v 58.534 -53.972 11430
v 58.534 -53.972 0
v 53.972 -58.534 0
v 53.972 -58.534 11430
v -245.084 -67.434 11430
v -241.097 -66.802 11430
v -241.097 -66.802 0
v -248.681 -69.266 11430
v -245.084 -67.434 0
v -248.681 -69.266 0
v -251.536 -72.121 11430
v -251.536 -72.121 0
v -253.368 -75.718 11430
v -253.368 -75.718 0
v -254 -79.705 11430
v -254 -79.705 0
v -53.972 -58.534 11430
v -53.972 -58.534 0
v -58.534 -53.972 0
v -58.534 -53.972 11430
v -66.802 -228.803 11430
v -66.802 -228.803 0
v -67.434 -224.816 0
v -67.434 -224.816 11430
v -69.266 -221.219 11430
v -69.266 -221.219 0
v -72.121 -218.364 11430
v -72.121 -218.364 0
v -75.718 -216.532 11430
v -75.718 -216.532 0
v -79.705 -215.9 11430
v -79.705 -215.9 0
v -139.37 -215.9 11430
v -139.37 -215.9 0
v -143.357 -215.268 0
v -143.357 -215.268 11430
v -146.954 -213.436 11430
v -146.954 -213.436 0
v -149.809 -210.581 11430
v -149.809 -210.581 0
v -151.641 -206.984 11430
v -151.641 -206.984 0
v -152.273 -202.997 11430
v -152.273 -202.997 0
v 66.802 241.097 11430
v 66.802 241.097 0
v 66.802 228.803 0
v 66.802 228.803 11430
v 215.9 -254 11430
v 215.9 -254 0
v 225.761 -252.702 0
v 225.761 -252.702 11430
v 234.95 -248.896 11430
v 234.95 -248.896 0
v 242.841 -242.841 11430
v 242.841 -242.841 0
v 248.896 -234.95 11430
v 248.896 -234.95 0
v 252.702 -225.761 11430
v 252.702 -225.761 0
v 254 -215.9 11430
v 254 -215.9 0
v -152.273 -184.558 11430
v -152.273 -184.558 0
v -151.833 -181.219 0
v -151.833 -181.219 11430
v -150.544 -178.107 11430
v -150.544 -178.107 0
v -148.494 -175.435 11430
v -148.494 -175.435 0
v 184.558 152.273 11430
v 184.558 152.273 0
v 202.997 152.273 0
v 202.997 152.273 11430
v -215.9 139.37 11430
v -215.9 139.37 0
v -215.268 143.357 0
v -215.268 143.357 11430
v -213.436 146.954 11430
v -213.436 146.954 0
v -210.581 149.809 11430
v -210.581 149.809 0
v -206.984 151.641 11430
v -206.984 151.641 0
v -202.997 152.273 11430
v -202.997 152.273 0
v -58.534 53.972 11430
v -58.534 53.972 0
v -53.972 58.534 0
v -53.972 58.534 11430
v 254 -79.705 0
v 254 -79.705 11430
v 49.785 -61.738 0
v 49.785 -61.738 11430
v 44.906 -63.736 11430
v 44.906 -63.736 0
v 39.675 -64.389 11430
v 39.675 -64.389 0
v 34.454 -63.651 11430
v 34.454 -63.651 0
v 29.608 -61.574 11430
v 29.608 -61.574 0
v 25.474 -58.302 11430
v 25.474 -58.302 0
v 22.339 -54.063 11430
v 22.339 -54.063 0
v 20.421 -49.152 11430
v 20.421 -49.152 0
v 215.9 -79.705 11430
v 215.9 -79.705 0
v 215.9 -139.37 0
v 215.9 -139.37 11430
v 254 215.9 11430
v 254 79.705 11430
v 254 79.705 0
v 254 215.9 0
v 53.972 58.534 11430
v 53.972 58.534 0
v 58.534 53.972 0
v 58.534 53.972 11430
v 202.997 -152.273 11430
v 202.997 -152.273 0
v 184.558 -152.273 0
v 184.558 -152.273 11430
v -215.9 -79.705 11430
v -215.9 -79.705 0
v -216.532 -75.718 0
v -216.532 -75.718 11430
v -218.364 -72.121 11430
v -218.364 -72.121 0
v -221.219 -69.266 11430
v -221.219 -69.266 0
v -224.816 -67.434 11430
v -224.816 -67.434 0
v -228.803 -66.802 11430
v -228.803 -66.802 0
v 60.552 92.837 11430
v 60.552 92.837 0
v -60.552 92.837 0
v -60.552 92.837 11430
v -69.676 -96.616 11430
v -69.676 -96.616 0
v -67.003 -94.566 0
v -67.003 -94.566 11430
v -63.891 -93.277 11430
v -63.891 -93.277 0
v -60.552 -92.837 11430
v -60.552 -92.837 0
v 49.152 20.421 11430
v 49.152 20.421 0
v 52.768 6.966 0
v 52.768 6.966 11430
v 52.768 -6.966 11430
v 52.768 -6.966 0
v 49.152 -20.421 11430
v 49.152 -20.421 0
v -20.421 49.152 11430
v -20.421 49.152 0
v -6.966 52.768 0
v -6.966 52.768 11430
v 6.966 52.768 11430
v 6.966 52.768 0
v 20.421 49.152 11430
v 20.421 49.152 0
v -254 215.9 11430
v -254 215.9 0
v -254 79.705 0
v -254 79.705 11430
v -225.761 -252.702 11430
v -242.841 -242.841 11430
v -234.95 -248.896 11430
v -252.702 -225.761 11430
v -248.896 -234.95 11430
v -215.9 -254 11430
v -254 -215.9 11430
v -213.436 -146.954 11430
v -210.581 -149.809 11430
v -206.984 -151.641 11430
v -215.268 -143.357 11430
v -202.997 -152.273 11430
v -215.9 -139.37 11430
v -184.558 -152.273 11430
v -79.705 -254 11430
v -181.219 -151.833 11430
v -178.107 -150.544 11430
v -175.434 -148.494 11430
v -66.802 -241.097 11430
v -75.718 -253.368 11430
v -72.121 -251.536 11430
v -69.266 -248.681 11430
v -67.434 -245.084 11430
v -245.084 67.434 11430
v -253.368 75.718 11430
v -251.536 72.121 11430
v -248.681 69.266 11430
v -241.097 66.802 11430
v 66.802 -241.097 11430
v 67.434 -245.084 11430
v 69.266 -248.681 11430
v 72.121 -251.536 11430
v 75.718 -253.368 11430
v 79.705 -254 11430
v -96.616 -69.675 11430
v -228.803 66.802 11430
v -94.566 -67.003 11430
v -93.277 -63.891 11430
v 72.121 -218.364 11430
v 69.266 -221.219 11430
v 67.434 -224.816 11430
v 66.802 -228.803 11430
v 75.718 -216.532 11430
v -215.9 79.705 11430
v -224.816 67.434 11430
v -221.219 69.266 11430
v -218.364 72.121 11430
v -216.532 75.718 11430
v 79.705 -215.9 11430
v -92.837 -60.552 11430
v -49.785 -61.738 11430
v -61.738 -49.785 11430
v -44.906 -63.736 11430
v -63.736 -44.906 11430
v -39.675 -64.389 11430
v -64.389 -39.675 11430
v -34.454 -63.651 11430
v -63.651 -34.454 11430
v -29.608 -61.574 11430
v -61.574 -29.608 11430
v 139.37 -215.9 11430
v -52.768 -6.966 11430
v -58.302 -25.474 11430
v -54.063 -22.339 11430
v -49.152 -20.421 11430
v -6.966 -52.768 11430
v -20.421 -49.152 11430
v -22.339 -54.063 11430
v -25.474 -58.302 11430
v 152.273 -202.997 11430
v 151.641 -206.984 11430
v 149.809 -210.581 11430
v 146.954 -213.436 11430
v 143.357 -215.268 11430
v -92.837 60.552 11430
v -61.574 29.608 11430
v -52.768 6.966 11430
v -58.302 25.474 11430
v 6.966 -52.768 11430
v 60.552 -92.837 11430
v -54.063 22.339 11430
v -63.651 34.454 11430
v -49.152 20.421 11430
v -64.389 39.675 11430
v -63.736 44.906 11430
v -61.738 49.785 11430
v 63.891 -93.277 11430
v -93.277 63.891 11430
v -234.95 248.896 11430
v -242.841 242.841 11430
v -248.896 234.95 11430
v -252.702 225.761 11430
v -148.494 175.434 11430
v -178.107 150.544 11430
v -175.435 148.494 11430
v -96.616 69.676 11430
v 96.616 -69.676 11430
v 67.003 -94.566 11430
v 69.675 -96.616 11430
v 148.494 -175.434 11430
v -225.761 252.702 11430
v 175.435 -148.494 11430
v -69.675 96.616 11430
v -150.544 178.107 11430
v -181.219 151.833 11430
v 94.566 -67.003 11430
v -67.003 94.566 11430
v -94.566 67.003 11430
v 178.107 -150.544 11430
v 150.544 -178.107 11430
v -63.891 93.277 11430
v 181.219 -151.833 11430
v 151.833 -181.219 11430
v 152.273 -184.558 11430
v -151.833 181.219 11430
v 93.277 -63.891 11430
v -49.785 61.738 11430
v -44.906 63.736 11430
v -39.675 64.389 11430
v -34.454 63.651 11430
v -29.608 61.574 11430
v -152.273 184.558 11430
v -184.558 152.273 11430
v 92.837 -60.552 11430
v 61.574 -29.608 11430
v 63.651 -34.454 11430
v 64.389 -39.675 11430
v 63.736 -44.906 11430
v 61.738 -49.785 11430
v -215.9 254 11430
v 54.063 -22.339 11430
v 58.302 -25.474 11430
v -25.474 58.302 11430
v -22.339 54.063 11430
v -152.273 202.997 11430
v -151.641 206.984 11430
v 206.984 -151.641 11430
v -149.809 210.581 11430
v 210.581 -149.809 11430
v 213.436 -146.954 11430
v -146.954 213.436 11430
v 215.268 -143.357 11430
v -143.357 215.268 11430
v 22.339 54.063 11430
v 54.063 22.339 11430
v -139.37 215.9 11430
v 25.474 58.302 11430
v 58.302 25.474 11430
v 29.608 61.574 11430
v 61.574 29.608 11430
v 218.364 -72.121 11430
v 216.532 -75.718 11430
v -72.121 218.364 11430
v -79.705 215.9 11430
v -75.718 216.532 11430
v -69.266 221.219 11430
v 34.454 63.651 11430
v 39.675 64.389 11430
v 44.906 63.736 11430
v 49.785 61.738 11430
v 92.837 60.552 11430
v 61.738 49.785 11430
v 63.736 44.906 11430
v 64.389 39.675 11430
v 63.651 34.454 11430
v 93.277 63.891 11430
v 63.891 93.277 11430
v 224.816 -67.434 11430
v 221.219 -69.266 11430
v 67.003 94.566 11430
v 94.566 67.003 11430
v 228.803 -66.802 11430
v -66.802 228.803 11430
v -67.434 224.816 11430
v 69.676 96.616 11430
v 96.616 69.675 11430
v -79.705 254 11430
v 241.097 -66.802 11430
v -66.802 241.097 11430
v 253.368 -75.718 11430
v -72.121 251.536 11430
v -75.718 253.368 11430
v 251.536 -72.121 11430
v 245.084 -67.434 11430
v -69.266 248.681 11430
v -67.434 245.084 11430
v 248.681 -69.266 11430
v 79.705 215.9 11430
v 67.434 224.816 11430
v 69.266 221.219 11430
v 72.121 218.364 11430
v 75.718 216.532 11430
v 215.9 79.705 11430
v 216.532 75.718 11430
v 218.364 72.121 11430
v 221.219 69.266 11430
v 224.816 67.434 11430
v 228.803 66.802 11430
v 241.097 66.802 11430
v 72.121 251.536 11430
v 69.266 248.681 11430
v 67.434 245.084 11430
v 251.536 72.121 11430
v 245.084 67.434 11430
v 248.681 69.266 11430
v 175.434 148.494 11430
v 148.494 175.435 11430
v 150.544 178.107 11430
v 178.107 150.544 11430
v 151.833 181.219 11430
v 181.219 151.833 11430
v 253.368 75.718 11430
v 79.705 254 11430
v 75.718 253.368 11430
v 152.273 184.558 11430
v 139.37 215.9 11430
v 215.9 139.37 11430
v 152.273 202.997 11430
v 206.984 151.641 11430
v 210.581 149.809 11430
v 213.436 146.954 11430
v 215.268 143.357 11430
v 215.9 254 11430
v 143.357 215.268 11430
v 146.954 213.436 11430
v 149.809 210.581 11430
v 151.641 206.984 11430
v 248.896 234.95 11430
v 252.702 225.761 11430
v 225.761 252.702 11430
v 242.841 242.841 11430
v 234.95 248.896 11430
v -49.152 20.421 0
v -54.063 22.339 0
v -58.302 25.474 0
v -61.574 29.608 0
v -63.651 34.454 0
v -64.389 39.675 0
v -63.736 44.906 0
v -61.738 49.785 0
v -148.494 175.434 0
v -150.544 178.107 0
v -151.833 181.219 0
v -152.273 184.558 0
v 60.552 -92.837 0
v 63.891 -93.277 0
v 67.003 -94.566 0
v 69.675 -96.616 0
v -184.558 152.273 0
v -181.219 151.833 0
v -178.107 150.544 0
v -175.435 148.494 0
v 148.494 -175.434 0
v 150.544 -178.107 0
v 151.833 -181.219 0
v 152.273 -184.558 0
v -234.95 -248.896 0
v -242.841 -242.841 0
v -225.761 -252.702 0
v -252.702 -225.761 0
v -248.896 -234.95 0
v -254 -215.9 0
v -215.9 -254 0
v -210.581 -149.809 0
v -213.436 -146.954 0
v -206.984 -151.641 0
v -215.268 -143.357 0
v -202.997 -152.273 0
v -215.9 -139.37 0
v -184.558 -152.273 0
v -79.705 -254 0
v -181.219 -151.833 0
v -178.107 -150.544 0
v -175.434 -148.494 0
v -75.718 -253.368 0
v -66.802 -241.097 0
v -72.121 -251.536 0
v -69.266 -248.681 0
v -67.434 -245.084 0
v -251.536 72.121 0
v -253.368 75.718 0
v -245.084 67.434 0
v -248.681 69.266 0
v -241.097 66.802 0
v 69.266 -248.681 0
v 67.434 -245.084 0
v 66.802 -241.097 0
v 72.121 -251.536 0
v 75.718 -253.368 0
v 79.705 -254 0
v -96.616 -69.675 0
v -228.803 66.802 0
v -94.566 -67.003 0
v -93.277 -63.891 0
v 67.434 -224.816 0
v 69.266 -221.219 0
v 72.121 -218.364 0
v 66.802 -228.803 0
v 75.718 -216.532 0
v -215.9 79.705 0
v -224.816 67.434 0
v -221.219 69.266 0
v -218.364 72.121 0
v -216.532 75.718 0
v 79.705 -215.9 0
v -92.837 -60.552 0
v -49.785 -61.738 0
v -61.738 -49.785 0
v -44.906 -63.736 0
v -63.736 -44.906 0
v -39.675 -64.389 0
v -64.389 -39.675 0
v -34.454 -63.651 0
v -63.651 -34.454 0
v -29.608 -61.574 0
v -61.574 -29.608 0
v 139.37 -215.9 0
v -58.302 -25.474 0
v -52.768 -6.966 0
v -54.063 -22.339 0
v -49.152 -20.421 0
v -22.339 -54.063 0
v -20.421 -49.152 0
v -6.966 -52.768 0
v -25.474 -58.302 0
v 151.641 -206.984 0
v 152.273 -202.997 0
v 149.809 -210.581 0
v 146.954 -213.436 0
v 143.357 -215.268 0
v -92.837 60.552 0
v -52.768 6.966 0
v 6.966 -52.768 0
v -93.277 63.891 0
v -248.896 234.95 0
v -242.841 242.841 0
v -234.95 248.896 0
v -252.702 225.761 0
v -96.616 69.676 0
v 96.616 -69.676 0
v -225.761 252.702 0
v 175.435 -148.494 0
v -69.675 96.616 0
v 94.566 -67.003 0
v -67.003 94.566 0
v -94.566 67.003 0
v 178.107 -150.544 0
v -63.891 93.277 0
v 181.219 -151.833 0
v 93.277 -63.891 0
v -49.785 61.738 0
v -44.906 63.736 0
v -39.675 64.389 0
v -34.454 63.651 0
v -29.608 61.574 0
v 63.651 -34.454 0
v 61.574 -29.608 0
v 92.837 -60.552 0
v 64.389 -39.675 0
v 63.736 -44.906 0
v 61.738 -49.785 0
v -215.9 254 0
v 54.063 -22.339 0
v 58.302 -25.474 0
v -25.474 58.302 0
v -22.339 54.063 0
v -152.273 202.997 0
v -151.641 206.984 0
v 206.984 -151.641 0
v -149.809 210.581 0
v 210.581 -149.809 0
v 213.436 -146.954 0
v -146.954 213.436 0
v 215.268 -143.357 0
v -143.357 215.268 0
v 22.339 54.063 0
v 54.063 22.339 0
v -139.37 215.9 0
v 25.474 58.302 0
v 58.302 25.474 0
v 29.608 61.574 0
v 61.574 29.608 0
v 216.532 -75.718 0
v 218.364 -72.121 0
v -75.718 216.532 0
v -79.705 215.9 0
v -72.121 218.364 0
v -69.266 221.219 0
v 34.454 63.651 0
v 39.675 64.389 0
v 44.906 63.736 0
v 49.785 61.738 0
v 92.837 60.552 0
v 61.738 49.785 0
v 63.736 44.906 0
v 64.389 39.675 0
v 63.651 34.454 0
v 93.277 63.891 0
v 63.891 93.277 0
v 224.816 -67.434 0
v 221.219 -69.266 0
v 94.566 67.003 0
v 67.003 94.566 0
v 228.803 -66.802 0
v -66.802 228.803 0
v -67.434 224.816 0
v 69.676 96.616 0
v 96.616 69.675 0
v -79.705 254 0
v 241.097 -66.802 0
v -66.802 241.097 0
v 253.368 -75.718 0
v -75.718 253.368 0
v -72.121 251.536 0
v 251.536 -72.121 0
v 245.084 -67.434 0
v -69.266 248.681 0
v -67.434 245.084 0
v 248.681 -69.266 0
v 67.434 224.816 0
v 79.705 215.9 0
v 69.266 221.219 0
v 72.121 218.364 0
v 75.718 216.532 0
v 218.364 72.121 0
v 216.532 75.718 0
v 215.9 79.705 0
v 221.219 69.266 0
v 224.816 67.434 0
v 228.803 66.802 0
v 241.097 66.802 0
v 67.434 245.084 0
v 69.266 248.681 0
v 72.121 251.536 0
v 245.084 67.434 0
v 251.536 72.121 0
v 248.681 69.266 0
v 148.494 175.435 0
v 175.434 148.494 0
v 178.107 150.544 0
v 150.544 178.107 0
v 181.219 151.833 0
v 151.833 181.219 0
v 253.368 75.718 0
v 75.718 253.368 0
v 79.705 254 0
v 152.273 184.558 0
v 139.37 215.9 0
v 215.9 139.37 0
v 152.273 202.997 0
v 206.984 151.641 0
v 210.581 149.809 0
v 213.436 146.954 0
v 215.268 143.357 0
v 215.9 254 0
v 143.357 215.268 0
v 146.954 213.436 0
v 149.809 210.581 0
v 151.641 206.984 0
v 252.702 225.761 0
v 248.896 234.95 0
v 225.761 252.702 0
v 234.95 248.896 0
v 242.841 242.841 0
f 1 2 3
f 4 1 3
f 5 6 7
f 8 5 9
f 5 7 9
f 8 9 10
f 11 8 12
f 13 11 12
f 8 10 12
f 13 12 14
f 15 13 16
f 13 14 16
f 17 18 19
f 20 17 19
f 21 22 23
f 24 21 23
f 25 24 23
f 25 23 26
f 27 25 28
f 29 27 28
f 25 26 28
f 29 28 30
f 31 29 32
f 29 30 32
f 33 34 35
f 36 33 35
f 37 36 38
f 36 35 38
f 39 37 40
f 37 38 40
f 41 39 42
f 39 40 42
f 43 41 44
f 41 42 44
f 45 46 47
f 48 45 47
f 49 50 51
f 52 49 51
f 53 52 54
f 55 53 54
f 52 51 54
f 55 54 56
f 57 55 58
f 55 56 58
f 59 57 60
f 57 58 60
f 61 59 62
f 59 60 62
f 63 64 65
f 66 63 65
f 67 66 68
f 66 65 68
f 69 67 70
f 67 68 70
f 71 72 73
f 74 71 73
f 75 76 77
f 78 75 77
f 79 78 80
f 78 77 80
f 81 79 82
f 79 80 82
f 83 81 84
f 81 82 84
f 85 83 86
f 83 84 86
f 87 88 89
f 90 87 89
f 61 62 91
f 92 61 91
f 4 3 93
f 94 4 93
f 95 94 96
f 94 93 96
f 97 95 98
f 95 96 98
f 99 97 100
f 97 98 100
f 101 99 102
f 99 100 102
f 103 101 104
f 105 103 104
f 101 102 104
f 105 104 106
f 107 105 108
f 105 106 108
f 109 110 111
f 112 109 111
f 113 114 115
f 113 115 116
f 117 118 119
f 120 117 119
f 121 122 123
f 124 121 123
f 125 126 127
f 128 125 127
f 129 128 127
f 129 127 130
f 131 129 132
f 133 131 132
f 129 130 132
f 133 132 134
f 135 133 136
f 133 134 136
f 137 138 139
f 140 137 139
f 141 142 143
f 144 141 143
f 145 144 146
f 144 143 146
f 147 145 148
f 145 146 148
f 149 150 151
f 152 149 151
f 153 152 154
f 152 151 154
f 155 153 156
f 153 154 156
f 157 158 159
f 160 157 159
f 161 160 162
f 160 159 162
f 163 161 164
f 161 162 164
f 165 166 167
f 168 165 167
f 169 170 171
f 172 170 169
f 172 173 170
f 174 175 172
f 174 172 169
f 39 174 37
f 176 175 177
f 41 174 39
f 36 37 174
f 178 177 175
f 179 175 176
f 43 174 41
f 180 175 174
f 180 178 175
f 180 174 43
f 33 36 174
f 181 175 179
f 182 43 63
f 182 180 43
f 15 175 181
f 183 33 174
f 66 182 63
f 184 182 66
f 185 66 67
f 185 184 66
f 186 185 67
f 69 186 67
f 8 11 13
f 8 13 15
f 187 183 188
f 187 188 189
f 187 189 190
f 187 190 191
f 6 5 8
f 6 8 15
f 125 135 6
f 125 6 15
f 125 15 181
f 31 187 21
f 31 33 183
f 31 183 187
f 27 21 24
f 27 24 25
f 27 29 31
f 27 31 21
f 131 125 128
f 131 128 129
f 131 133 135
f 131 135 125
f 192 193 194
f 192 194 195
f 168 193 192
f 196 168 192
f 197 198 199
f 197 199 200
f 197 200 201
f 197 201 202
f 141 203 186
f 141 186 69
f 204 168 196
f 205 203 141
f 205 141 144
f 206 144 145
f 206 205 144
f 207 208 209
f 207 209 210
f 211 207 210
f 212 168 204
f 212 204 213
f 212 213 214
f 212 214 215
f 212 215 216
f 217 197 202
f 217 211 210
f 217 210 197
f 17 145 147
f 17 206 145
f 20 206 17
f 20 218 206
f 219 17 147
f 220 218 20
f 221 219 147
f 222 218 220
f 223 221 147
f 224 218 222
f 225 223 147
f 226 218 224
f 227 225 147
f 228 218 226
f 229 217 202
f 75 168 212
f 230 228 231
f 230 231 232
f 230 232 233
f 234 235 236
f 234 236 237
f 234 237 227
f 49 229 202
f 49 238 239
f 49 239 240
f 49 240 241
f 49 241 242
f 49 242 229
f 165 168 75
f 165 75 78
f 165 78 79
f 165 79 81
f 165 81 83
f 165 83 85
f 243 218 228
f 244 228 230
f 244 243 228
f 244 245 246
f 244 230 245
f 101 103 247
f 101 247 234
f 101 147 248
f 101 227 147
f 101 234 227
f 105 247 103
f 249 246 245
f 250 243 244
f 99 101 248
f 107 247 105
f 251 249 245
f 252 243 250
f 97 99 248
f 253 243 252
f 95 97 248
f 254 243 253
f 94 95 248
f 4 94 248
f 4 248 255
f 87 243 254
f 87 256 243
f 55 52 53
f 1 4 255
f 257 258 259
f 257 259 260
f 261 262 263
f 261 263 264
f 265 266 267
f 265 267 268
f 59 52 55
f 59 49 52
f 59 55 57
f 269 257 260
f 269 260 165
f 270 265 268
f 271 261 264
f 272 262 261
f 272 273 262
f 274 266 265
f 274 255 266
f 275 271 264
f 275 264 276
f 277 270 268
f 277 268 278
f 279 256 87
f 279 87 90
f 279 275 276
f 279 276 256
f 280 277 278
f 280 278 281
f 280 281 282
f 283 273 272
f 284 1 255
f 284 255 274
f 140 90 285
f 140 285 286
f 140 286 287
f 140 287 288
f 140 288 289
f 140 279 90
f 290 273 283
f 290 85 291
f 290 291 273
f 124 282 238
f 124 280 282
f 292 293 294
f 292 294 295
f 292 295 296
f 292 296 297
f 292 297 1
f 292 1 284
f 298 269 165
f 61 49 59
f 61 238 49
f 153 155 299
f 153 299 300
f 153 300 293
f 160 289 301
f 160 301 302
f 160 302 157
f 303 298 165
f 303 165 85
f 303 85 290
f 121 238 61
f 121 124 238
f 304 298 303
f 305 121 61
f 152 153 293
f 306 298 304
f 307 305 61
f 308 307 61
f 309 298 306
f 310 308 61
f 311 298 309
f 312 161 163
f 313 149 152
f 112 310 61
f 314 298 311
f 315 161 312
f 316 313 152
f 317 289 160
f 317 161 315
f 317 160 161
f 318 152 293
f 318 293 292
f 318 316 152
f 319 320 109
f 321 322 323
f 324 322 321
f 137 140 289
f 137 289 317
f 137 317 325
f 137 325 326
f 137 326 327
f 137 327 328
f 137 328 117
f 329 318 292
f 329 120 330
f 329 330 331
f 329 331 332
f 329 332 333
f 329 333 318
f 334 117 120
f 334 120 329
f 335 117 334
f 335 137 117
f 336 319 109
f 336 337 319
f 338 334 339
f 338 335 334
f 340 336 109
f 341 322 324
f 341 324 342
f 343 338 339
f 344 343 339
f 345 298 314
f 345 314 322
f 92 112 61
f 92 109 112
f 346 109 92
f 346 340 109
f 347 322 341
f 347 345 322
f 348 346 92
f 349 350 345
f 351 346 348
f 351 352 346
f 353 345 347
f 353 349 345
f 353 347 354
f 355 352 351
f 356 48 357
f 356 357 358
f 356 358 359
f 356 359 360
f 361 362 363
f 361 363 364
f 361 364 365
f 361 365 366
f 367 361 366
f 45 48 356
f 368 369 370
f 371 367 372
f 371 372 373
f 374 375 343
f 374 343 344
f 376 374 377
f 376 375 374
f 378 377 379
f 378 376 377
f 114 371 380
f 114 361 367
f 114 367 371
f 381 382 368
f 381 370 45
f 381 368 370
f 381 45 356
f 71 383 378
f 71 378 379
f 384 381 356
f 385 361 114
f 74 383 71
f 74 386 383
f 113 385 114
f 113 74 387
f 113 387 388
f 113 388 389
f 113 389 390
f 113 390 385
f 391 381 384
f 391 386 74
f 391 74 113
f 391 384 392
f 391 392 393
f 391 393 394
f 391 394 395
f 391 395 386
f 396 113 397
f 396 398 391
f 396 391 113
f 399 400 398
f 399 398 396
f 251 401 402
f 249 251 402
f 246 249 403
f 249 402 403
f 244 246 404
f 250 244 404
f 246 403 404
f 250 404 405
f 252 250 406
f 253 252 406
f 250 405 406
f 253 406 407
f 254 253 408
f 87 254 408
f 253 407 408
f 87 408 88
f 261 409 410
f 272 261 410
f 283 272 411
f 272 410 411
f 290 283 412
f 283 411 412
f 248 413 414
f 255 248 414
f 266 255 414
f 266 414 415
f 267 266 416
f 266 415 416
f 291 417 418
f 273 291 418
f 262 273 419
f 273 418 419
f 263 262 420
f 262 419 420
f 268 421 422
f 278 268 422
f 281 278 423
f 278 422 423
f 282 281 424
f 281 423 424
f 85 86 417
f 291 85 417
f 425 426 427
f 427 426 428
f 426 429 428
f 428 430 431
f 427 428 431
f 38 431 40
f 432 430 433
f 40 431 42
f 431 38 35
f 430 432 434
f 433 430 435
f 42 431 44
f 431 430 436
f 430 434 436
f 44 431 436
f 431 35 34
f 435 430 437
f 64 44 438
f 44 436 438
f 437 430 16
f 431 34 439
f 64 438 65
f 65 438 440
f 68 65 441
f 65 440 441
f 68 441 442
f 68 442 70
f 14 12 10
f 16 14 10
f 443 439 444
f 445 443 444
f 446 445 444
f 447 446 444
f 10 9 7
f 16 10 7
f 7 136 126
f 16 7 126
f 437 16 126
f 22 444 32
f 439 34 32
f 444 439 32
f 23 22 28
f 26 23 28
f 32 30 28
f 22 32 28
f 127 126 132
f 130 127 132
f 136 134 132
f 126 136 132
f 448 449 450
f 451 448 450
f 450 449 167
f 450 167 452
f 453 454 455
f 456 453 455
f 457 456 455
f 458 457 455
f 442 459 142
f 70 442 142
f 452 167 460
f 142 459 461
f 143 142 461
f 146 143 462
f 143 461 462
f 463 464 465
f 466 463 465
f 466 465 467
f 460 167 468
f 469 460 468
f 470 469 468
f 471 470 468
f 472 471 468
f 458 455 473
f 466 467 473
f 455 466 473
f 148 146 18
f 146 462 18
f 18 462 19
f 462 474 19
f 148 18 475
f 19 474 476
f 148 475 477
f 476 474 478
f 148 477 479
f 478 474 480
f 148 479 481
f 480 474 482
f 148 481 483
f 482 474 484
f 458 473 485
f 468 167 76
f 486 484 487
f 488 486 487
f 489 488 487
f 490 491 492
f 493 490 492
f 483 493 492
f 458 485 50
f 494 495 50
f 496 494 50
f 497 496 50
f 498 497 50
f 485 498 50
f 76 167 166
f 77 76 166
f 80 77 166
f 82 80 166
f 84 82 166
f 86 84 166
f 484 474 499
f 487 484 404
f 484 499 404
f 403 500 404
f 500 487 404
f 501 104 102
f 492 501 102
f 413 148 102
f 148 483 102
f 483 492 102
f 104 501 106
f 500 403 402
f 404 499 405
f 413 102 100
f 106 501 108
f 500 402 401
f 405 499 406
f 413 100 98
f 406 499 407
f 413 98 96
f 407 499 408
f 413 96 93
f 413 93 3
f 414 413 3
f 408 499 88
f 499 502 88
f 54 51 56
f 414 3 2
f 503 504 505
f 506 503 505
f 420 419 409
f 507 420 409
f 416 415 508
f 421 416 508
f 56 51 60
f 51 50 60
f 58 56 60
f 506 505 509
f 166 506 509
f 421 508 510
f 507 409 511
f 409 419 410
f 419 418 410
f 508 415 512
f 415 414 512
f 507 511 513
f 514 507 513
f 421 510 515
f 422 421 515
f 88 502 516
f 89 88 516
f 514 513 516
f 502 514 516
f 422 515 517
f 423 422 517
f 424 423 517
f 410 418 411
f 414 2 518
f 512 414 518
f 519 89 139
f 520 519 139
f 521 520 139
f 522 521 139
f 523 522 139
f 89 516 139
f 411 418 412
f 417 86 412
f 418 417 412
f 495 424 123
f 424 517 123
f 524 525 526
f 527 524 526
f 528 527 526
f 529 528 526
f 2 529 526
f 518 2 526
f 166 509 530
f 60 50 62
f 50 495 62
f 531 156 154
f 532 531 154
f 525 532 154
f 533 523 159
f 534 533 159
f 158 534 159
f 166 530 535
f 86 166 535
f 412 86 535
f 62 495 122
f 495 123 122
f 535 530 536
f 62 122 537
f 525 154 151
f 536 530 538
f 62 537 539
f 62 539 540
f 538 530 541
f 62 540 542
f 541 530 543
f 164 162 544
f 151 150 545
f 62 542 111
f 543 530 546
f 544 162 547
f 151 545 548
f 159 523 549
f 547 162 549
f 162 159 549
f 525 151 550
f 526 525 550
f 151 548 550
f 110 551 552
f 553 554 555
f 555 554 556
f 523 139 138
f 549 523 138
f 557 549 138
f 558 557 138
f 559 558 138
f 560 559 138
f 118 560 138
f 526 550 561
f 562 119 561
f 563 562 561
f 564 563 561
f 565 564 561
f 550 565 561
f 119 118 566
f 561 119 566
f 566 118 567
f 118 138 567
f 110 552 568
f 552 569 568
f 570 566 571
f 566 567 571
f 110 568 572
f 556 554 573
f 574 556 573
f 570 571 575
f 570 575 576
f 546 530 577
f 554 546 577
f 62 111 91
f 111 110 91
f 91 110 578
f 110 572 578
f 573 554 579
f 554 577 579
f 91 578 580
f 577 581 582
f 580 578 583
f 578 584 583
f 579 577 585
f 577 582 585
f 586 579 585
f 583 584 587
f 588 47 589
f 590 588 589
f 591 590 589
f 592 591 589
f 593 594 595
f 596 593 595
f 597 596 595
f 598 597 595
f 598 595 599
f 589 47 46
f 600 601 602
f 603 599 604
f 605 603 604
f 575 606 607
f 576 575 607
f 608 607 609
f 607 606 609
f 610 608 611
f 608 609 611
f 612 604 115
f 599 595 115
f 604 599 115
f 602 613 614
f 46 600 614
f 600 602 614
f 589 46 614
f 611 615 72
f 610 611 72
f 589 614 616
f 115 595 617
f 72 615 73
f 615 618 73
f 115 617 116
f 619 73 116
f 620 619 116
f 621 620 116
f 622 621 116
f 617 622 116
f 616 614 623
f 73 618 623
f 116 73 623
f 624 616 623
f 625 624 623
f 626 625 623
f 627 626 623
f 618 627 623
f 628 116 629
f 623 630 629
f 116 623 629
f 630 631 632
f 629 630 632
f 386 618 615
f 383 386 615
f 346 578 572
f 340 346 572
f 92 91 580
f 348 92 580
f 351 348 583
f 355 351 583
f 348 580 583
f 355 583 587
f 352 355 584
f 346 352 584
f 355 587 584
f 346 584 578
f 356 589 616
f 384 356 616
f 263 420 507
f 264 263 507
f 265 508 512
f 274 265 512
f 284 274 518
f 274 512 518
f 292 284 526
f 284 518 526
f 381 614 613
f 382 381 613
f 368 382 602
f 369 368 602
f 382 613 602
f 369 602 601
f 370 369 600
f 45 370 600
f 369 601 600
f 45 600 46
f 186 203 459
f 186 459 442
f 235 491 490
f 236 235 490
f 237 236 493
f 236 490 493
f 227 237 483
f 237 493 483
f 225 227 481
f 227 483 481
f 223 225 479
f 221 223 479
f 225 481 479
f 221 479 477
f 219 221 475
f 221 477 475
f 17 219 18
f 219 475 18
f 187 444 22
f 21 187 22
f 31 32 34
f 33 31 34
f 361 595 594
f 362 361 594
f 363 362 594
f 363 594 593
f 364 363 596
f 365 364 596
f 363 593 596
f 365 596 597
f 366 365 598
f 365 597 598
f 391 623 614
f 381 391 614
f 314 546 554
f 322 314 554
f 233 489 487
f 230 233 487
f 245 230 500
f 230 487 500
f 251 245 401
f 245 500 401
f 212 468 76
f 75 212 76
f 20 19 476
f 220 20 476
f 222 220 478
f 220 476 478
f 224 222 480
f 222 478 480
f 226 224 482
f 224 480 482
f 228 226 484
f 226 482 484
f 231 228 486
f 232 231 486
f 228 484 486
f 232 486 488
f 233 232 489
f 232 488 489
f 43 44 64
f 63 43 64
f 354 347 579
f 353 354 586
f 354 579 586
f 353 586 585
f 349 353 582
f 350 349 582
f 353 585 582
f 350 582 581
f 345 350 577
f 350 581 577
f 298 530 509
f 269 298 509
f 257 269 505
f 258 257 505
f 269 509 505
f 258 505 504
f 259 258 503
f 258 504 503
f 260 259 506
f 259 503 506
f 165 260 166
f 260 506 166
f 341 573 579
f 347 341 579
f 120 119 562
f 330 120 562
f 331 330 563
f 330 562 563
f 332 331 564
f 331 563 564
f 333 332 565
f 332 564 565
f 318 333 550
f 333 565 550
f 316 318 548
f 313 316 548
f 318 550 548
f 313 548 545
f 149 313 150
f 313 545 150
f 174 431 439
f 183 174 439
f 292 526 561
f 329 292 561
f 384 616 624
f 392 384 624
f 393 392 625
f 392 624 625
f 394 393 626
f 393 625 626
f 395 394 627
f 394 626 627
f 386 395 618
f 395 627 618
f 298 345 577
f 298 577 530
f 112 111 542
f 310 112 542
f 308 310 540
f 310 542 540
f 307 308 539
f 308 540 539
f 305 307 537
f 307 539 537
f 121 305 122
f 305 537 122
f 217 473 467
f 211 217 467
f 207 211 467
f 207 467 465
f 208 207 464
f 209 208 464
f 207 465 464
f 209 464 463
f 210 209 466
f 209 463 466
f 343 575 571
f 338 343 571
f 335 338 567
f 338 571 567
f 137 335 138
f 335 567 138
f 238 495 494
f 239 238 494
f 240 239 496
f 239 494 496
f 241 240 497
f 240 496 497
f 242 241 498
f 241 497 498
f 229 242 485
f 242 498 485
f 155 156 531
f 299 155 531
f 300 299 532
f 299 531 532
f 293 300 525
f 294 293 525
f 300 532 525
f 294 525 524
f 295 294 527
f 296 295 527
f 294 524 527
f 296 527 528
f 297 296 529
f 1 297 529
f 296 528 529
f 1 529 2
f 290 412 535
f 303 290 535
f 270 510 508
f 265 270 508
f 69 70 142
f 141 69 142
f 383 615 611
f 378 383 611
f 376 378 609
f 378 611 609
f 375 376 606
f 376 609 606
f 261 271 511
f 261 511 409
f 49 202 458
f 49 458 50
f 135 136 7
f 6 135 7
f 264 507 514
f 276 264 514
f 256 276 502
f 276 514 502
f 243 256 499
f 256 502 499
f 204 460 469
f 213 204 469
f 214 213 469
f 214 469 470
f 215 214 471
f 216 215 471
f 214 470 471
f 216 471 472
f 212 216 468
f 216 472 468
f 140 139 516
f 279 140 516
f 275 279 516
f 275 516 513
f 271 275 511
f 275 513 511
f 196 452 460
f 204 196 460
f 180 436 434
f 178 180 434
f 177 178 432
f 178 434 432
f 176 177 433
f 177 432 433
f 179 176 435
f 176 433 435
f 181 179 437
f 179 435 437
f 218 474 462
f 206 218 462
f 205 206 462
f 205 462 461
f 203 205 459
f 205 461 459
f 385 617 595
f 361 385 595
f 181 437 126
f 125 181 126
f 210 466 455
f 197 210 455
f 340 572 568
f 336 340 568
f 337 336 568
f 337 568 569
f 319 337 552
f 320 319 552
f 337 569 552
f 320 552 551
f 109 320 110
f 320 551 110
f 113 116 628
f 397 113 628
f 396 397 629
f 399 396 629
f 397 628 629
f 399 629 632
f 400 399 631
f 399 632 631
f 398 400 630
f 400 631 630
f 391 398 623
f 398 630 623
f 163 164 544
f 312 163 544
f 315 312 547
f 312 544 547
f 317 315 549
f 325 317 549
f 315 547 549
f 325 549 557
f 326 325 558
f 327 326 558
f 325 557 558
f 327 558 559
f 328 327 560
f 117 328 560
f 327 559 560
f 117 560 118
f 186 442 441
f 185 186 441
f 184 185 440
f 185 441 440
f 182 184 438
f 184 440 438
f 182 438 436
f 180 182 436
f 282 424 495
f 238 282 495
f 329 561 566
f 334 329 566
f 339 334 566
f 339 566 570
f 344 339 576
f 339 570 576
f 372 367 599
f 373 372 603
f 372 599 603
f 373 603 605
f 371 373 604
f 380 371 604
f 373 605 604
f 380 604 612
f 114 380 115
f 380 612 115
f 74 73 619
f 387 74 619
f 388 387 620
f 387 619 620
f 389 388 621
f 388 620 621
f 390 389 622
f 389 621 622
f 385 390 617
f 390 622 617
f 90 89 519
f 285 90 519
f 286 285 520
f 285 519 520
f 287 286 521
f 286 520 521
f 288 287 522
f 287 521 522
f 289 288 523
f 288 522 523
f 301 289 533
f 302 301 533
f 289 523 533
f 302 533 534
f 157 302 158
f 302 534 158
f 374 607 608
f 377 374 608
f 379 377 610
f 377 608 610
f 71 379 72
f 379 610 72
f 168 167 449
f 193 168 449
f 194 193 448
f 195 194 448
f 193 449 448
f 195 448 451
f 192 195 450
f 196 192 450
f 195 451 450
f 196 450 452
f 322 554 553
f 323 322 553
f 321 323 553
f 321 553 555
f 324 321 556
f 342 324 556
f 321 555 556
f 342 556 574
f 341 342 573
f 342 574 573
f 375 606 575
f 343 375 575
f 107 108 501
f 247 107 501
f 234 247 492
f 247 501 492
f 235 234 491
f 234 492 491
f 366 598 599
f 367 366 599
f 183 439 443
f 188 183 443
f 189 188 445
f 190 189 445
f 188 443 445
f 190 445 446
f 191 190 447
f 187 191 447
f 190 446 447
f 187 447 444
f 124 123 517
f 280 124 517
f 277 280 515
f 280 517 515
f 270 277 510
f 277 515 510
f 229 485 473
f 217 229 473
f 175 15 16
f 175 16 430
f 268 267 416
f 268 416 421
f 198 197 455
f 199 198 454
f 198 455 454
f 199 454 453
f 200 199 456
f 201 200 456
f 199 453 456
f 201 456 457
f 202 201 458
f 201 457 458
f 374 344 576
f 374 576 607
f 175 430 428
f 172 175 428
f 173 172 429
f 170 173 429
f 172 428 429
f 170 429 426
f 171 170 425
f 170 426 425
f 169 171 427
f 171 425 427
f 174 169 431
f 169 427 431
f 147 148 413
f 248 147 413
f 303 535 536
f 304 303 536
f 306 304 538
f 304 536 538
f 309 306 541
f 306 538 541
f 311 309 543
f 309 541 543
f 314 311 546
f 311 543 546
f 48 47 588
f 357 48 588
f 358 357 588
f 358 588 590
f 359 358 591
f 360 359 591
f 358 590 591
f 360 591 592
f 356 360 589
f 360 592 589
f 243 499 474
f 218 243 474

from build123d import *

# Parameters (mm, degrees)
F1_DEPTH = 11430


# Not quite as in the source:
# - ends of sketch curves that miss each other by under 0.0002 mm in the source are joined


with BuildPart() as f1:
    # F0 (on Top) → F1 (new body)
    with BuildSketch(Plane.XY):
        with BuildLine():
            Line((228.8032, 66.802), (241.0968, 66.802))
            ThreePointArc((241.0968, 66.802), (250.220740219, 70.581259781), (254, 79.7052))
            Line((254, 79.7052), (254, 215.9))
            ThreePointArc((254, 215.9), (242.8407683632, 242.8407683632), (215.9, 254))
            Line((215.9, 254), (79.7052, 254))
            ThreePointArc((79.7052, 254), (70.581259781, 250.220740219), (66.802, 241.0968))
            Line((66.802, 241.0968), (66.802, 228.8032))
            ThreePointArc((66.802, 228.8032), (70.581259781, 219.679259781), (79.7052, 215.9))
            Line((79.7052, 215.9), (139.3698, 215.9))
            ThreePointArc((139.3698, 215.9), (148.493740219, 212.120740219), (152.273, 202.9968))
            Line((152.273, 202.9968), (152.273, 184.5584574))
            ThreePointArc((152.273, 184.5584574), (151.2907989473, 179.6206082388), (148.493727519, 175.434504481))
            Line((148.493727519, 175.434504481), (69.675502, 96.616266))
            ThreePointArc((69.675502, 96.616266), (65.4893917612, 93.8192010527), (60.5515426, 92.837))
            Line((60.5515426, 92.837), (-60.5515426, 92.837))
            ThreePointArc((-60.5515426, 92.837), (-65.4893917612, 93.8192010527), (-69.675495519, 96.616272481))
            Line((-69.675495519, 96.616272481), (-148.493734, 175.434498))
            ThreePointArc((-148.493734, 175.434498), (-151.2907989473, 179.6206082388), (-152.273, 184.5584574))
            Line((-152.273, 184.5584574), (-152.273, 202.9968))
            ThreePointArc((-152.273, 202.9968), (-148.493740219, 212.120740219), (-139.3698, 215.9))
            Line((-139.3698, 215.9), (-79.7052, 215.9))
            ThreePointArc((-79.7052, 215.9), (-70.581259781, 219.679259781), (-66.802, 228.8032))
            Line((-66.802, 228.8032), (-66.802, 241.0968))
            ThreePointArc((-66.802, 241.0968), (-70.581259781, 250.220740219), (-79.7052, 254))
            Line((-79.7052, 254), (-215.9, 254))
            ThreePointArc((-215.9, 254), (-242.8407683632, 242.8407683632), (-254, 215.9))
            Line((-254, 215.9), (-254, 79.7052))
            ThreePointArc((-254, 79.7052), (-250.220740219, 70.581259781), (-241.0968, 66.802))
            Line((-241.0968, 66.802), (-228.8032, 66.802))
            ThreePointArc((-228.8032, 66.802), (-219.679259781, 70.581259781), (-215.9, 79.7052))
            Line((-215.9, 79.7052), (-215.9, 139.3698))
            ThreePointArc((-215.9, 139.3698), (-212.120740219, 148.493740219), (-202.9968, 152.273))
            Line((-202.9968, 152.273), (-184.5584574, 152.273))
            ThreePointArc((-184.5584574, 152.273), (-179.6206082388, 151.2907989473), (-175.434504481, 148.493727519))
            Line((-175.434504481, 148.493727519), (-96.616266, 69.675502))
            ThreePointArc((-96.616266, 69.675502), (-93.8192010527, 65.4893917612), (-92.837, 60.5515426))
            Line((-92.837, 60.5515426), (-92.837, -60.5515426))
            ThreePointArc((-92.837, -60.5515426), (-93.8192010527, -65.4893917612), (-96.616272481, -69.675495519))
            Line((-96.616272481, -69.675495519), (-175.434498, -148.493734))
            ThreePointArc((-175.434498, -148.493734), (-179.6206082388, -151.2907989473), (-184.5584574, -152.273))
            Line((-184.5584574, -152.273), (-202.9968, -152.273))
            ThreePointArc((-202.9968, -152.273), (-212.120740219, -148.493740219), (-215.9, -139.3698))
            Line((-215.9, -139.3698), (-215.9, -79.7052))
            ThreePointArc((-215.9, -79.7052), (-219.679259781, -70.581259781), (-228.8032, -66.802))
            Line((-228.8032, -66.802), (-241.0968, -66.802))
            ThreePointArc((-241.0968, -66.802), (-250.220740219, -70.581259781), (-254, -79.7052))
            Line((-254, -79.7052), (-254, -215.9))
            ThreePointArc((-254, -215.9), (-242.8407683632, -242.8407683632), (-215.9, -254))
            Line((-215.9, -254), (-79.7052, -254))
            ThreePointArc((-79.7052, -254), (-70.581259781, -250.220740219), (-66.802, -241.0968))
            Line((-66.802, -241.0968), (-66.802, -228.8032))
            ThreePointArc((-66.802, -228.8032), (-70.581259781, -219.679259781), (-79.7052, -215.9))
            Line((-79.7052, -215.9), (-139.3698, -215.9))
            ThreePointArc((-139.3698, -215.9), (-148.493740219, -212.120740219), (-152.273, -202.9968))
            Line((-152.273, -202.9968), (-152.273, -184.5584574))
            ThreePointArc((-152.273, -184.5584574), (-151.2907989473, -179.6206082388), (-148.493727519, -175.434504481))
            Line((-148.493727519, -175.434504481), (-69.675502, -96.616266))
            ThreePointArc((-69.675502, -96.616266), (-65.4893917612, -93.8192010527), (-60.5515426, -92.837))
            Line((-60.5515426, -92.837), (60.5515426, -92.837))
            ThreePointArc((60.5515426, -92.837), (65.4893917612, -93.8192010527), (69.675495519, -96.616272481))
            Line((69.675495519, -96.616272481), (148.493734, -175.434498))
            ThreePointArc((148.493734, -175.434498), (151.2907989473, -179.6206082388), (152.273, -184.5584574))
            Line((152.273, -184.5584574), (152.273, -202.9968))
            ThreePointArc((152.273, -202.9968), (148.493740219, -212.120740219), (139.3698, -215.9))
            Line((139.3698, -215.9), (79.7052, -215.9))
            ThreePointArc((79.7052, -215.9), (70.581259781, -219.679259781), (66.802, -228.8032))
            Line((66.802, -228.8032), (66.802, -241.0968))
            ThreePointArc((66.802, -241.0968), (70.581259781, -250.220740219), (79.7052, -254))
            Line((79.7052, -254), (215.9, -254))
            ThreePointArc((215.9, -254), (242.8407683632, -242.8407683632), (254, -215.9))
            Line((254, -215.9), (254, -79.7052))
            ThreePointArc((254, -79.7052), (250.220740219, -70.581259781), (241.0968, -66.802))
            Line((241.0968, -66.802), (228.8032, -66.802))
            ThreePointArc((228.8032, -66.802), (219.679259781, -70.581259781), (215.9, -79.7052))
            Line((215.9, -79.7052), (215.9, -139.3698))
            ThreePointArc((215.9, -139.3698), (212.120740219, -148.493740219), (202.9968, -152.273))
            Line((202.9968, -152.273), (184.5584574, -152.273))
            ThreePointArc((184.5584574, -152.273), (179.6206082388, -151.2907989473), (175.434504481, -148.493727519))
            Line((175.434504481, -148.493727519), (96.616266, -69.675502))
            ThreePointArc((96.616266, -69.675502), (93.8192010527, -65.4893917612), (92.837, -60.5515426))
            Line((92.837, -60.5515426), (92.837, 60.5515426))
            ThreePointArc((92.837, 60.5515426), (93.8192010527, 65.4893917612), (96.616272481, 69.675495519))
            Line((96.616272481, 69.675495519), (175.434498, 148.493734))
            ThreePointArc((175.434498, 148.493734), (179.6206082388, 151.2907989473), (184.5584574, 152.273))
            Line((184.5584574, 152.273), (202.9968, 152.273))
            ThreePointArc((202.9968, 152.273), (212.120740219, 148.493740219), (215.9, 139.3698))
            Line((215.9, 139.3698), (215.9, 79.7052))
            ThreePointArc((215.9, 79.7052), (219.679259781, 70.581259781), (228.8032, 66.802))
        make_face()
        with BuildLine():
            ThreePointArc((-20.4210161511, -49.152403514), (-34.4542925862, -63.6508288974), (-53.9724863346, -58.5344533346))
            Line((-53.9724863346, -58.5344533346), (-58.5344524, -53.9724854))
            ThreePointArc((-58.5344524, -53.9724854), (-63.6508288974, -34.4542925862), (-49.152403514, -20.4210161511))
            ThreePointArc((-49.152403514, -20.4210161511), (-53.2257, 0), (-49.1523903665, 20.421010302))
            ThreePointArc((-49.1523903665, 20.421010302), (-63.6508288974, 34.4542925862), (-58.5344533346, 53.9724863346))
            Line((-58.5344533346, 53.9724863346), (-53.9724854, 58.5344524))
            ThreePointArc((-53.9724854, 58.5344524), (-34.4542925862, 63.6508288974), (-20.4210161511, 49.152403514))
            ThreePointArc((-20.4210161511, 49.152403514), (0, 53.2257), (20.421010302, 49.1523903665))
            ThreePointArc((20.421010302, 49.1523903665), (34.4542925862, 63.6508288974), (53.9724863346, 58.5344533346))
            Line((53.9724863346, 58.5344533346), (58.5344524, 53.9724854))
            ThreePointArc((58.5344524, 53.9724854), (63.6508288974, 34.4542925862), (49.152403514, 20.4210161511))
            ThreePointArc((49.152403514, 20.4210161511), (53.2257, 0), (49.1523903665, -20.421010302))
            ThreePointArc((49.1523903665, -20.421010302), (63.6508288974, -34.4542925862), (58.5344533346, -53.9724863346))
            Line((58.5344533346, -53.9724863346), (53.9724854, -58.5344524))
            ThreePointArc((53.9724854, -58.5344524), (34.4542925862, -63.6508288974), (20.4210161511, -49.152403514))
            ThreePointArc((20.4210161511, -49.152403514), (0, -53.2257), (-20.4210161511, -49.152403514))
        make_face(mode=Mode.SUBTRACT)
    extrude(amount=F1_DEPTH)


solid = f1.part
